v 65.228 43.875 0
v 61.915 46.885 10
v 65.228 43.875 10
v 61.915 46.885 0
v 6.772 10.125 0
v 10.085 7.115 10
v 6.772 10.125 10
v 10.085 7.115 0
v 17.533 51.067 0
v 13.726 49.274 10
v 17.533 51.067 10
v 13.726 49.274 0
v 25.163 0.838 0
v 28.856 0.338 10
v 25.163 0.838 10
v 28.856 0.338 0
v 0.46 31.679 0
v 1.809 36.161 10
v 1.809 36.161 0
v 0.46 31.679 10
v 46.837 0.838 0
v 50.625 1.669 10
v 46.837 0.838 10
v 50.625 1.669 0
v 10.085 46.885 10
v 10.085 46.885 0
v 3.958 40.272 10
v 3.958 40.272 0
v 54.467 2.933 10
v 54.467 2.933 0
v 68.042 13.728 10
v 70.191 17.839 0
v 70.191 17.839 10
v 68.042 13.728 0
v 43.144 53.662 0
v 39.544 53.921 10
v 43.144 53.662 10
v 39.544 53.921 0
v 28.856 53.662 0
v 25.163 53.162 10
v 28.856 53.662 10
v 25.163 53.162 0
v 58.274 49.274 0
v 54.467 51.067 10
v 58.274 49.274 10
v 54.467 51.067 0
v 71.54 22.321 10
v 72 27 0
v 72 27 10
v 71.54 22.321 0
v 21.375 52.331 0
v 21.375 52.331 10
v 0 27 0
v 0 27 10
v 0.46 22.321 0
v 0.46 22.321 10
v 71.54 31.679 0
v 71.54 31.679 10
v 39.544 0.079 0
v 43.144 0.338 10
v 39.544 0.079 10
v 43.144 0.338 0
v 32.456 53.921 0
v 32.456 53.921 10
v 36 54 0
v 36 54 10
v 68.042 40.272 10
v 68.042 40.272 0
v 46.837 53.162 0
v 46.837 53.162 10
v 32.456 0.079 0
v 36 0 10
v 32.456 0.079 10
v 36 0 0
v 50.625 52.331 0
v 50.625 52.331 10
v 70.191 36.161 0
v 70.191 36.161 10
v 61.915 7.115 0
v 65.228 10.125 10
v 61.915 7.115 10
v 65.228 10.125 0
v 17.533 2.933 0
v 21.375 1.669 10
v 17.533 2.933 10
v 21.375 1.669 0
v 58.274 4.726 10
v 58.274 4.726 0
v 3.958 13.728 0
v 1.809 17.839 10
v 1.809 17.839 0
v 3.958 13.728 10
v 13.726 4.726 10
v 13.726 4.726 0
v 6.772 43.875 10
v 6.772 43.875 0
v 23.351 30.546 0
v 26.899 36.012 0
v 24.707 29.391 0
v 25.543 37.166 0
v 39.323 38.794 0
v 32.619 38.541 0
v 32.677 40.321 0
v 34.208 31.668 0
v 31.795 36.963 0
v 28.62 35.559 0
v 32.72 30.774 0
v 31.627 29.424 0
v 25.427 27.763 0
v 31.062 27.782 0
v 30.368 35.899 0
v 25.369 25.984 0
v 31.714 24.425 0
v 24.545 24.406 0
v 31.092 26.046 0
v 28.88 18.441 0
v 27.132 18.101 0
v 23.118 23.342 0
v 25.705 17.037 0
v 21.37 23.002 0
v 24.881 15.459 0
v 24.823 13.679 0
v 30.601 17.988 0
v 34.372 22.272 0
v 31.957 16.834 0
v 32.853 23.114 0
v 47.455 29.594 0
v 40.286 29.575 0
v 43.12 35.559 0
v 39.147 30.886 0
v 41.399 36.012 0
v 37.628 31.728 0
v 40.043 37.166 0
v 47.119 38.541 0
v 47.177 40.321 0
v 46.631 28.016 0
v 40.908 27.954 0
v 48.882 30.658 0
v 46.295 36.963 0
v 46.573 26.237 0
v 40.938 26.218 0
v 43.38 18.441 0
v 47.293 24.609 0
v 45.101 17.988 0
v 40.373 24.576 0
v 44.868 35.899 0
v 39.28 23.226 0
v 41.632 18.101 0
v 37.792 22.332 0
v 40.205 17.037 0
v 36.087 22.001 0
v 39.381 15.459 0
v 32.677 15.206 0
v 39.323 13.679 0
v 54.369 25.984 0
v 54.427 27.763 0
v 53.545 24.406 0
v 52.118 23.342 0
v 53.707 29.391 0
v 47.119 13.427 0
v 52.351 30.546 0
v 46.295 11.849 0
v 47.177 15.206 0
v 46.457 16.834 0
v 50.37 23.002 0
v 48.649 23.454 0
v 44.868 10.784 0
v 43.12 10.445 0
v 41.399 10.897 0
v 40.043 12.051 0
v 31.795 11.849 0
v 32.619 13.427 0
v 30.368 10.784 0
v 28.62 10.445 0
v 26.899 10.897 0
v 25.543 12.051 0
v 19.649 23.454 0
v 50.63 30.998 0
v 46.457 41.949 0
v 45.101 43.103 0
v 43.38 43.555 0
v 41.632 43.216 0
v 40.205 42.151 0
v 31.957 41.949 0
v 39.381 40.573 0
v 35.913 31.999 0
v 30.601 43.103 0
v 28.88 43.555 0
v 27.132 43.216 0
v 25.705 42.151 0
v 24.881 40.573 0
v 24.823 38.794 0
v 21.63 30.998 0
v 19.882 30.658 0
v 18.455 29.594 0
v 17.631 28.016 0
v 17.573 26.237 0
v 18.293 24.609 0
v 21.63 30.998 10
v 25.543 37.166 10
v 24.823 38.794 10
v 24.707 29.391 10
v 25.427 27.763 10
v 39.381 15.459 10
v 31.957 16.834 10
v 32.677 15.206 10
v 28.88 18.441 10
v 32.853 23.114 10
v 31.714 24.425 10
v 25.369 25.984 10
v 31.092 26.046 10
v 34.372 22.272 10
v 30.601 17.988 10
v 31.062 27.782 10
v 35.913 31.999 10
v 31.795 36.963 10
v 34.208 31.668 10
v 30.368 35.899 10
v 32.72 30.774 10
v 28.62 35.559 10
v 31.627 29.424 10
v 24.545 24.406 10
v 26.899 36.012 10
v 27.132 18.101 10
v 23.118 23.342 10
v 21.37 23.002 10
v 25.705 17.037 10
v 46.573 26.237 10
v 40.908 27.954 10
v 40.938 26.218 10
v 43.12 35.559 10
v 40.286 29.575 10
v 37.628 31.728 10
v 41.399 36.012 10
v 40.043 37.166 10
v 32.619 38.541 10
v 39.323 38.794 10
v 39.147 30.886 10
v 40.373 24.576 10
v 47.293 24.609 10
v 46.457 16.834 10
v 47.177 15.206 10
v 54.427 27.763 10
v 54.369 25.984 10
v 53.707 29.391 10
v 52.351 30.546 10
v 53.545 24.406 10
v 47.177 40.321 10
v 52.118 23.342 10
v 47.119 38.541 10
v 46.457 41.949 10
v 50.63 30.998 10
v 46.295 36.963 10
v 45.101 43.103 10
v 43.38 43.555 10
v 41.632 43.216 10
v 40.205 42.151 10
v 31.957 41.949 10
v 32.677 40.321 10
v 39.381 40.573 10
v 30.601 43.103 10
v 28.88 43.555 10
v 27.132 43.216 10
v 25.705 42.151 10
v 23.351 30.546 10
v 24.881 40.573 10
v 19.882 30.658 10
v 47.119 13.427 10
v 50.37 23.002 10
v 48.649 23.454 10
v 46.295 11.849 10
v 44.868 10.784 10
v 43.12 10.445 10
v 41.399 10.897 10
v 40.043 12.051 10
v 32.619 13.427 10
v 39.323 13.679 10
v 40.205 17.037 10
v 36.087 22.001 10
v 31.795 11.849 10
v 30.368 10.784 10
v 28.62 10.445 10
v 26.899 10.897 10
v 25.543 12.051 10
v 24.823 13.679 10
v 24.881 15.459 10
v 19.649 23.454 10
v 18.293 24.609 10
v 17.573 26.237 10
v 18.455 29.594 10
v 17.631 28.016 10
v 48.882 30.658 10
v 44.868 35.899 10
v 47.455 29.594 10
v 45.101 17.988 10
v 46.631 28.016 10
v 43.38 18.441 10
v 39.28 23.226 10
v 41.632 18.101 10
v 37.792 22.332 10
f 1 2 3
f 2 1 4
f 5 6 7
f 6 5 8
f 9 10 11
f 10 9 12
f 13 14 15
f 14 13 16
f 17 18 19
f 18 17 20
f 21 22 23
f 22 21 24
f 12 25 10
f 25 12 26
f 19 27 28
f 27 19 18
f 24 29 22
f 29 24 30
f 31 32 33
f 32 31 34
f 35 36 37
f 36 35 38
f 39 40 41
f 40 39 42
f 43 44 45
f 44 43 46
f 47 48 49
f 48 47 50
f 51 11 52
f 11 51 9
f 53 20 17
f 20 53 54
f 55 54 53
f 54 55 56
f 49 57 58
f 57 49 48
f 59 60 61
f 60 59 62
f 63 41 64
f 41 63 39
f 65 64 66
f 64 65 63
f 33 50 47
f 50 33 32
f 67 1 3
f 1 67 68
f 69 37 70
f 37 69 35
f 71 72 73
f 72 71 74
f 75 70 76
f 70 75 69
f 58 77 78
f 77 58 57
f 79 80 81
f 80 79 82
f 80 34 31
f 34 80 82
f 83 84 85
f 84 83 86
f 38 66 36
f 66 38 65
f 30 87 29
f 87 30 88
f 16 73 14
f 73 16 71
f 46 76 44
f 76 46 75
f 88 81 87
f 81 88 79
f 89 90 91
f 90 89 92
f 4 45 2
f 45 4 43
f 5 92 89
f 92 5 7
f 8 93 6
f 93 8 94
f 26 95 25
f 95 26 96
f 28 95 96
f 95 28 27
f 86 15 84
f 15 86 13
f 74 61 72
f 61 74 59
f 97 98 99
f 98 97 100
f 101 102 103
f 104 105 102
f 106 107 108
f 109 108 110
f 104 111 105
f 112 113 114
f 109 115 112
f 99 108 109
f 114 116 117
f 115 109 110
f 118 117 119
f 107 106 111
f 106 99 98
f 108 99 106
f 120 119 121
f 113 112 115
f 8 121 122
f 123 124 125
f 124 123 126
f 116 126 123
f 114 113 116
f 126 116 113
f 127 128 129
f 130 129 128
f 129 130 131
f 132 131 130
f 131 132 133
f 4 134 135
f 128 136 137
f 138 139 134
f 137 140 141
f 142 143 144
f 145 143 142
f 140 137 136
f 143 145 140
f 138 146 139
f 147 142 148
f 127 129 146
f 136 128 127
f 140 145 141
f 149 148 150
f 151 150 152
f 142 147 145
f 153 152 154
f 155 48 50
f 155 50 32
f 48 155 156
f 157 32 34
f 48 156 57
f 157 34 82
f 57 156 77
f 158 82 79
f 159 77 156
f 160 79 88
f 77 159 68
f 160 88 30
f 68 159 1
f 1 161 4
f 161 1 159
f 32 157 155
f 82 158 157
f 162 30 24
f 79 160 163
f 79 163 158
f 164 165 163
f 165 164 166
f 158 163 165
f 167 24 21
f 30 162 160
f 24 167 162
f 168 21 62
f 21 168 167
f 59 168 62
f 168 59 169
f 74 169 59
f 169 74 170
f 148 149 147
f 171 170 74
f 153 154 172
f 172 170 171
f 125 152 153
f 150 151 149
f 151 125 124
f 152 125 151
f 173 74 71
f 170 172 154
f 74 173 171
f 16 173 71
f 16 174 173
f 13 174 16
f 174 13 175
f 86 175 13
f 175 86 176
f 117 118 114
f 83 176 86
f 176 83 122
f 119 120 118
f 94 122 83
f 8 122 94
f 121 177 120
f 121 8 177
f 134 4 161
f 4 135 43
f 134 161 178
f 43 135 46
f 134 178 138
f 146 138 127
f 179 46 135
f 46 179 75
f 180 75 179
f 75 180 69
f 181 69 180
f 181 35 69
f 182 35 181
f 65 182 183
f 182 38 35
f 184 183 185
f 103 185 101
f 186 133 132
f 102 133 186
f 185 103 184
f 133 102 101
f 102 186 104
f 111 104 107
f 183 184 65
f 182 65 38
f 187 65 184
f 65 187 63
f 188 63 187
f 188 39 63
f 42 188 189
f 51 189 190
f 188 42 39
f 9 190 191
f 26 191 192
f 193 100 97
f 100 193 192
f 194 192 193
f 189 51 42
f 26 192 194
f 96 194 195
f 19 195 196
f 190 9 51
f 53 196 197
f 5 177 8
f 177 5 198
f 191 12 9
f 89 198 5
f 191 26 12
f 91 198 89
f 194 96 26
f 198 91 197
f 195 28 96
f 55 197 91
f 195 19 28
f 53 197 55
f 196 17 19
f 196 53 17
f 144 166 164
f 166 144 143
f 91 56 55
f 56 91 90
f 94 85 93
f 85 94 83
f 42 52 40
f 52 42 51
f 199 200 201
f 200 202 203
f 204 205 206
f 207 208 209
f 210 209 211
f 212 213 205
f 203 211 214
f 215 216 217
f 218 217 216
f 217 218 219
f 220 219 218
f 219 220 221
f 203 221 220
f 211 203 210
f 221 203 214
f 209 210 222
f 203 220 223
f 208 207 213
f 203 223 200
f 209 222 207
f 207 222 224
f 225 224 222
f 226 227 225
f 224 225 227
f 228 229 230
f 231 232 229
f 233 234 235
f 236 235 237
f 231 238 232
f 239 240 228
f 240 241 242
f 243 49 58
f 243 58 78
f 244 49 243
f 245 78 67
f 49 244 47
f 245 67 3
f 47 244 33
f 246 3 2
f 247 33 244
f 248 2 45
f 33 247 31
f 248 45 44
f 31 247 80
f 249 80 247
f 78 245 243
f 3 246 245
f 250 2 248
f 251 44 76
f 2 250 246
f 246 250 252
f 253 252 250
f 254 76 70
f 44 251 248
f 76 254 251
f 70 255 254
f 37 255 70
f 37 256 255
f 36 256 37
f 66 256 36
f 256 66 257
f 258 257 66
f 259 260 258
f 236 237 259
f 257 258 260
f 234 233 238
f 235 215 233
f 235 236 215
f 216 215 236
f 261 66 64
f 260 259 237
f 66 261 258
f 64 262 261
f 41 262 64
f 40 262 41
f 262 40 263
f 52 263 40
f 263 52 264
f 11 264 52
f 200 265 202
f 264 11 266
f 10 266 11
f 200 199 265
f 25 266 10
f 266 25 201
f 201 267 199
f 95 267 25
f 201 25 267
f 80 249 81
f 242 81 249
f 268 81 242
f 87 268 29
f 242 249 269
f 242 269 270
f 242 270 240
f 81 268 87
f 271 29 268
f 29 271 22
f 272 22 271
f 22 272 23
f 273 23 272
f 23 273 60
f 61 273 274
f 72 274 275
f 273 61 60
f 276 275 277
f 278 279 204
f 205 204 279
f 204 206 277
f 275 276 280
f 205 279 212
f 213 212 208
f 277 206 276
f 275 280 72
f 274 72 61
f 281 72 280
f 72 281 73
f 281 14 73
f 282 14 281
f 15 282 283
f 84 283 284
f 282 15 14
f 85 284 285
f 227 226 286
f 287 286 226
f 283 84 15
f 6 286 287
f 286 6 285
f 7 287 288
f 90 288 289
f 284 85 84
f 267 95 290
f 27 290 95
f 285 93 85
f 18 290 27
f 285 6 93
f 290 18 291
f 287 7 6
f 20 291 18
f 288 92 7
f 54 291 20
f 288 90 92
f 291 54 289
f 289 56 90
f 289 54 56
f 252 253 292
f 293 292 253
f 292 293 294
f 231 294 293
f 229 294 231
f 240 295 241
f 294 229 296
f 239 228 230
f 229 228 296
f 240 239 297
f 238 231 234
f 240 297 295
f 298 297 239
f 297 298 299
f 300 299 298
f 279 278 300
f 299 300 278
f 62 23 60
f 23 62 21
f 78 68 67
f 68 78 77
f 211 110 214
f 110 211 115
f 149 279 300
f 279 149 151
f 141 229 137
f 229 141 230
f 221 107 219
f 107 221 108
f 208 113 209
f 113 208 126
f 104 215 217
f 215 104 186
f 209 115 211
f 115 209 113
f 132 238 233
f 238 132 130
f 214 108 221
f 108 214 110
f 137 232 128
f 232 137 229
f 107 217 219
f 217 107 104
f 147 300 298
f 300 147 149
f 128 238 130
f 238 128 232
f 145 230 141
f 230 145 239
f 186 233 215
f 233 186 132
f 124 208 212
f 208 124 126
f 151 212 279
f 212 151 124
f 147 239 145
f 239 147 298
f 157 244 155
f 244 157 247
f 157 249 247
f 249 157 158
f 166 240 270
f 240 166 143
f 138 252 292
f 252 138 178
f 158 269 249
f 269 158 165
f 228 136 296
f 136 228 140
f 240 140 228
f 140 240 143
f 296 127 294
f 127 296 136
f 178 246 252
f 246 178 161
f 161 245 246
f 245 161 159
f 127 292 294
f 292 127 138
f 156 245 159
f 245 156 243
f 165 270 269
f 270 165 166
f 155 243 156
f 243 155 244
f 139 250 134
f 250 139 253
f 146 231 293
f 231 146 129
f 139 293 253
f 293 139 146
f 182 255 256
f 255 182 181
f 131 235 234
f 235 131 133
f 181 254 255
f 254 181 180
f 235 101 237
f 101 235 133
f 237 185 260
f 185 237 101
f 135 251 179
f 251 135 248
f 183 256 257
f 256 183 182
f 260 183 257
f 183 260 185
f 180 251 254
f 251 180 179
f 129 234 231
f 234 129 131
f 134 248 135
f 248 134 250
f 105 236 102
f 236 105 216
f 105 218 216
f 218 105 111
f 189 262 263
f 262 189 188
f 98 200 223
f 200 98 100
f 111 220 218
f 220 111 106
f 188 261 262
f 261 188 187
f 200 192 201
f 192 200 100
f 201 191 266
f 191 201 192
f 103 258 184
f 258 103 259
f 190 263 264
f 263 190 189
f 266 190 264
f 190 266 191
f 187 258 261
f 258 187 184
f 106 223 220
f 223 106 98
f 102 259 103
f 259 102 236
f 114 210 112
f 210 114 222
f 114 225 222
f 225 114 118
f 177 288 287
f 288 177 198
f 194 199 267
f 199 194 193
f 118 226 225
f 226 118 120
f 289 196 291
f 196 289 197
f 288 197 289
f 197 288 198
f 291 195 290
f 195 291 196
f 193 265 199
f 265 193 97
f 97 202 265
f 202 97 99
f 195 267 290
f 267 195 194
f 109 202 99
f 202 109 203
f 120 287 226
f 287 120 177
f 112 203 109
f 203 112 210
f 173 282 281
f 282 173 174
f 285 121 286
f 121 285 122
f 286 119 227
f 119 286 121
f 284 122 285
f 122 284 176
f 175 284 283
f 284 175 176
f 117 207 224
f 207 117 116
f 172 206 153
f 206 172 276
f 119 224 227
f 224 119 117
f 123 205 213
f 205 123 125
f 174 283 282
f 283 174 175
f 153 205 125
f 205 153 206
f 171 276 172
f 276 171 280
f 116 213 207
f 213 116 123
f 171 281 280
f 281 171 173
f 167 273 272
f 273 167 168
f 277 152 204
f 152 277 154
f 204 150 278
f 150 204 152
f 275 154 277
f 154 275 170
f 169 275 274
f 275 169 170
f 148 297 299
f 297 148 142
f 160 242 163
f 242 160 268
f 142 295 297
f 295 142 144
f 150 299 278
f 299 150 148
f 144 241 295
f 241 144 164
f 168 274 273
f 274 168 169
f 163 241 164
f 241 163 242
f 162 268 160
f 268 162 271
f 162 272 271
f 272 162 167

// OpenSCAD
$fn = 32;

// ----------------------------------------------------------------------
// Cam plate: double_lobe cam, base R24
// ----------------------------------------------------------------------

// --- parameters (mm) ---
base_r = 24;              // base circle radius
lobe_h = 12;              // cam lobe rise
bore_r = 5;               // shaft bore radius
plate_t = 10;             // plate thickness, Z (extrusion height)
ring_r = 14.5;            // lightening ring radius
bolt_r = 4;               // lightening hole radius

profile = [[72, 27], [71.54, 31.679], [70.191, 36.161], [68.042, 40.272], [65.228, 43.875], [61.915, 46.885], [58.274, 49.274], [54.467, 51.067], [50.625, 52.331], [46.837, 53.162], [43.144, 53.662], [39.544, 53.921], [36, 54], [32.456, 53.921], [28.856, 53.662], [25.163, 53.162], [21.375, 52.331], [17.533, 51.067], [13.726, 49.274], [10.085, 46.885], [6.772, 43.875], [3.958, 40.272], [1.809, 36.161], [0.46, 31.679], [0, 27], [0.46, 22.321], [1.809, 17.839], [3.958, 13.728], [6.772, 10.125], [10.085, 7.115], [13.726, 4.726], [17.533, 2.933], [21.375, 1.669], [25.163, 0.838], [28.856, 0.338], [32.456, 0.079], [36, 0], [39.544, 0.079], [43.144, 0.338], [46.837, 0.838], [50.625, 1.669], [54.467, 2.933], [58.274, 4.726], [61.915, 7.115], [65.228, 10.125], [68.042, 13.728], [70.191, 17.839], [71.54, 22.321]];  // primary outline, 48 points, counter clockwise
void_1 = [[40.908, 27.954], [40.286, 29.575], [39.147, 30.886], [37.628, 31.728], [35.913, 31.999], [34.208, 31.668], [32.72, 30.774], [31.627, 29.424], [31.062, 27.782], [31.092, 26.046], [31.714, 24.425], [32.853, 23.114], [34.372, 22.272], [36.087, 22.001], [37.792, 22.332], [39.28, 23.226], [40.373, 24.576], [40.938, 26.218]];  // shaft bore, 18 points
void_2 = [[54.427, 27.763], [53.707, 29.391], [52.351, 30.546], [50.63, 30.998], [48.882, 30.658], [47.455, 29.594], [46.631, 28.016], [46.573, 26.237], [47.293, 24.609], [48.649, 23.454], [50.37, 23.002], [52.118, 23.342], [53.545, 24.406], [54.369, 25.984]];  // lightening hole 1, 14 points
void_3 = [[47.177, 40.321], [46.457, 41.949], [45.101, 43.103], [43.38, 43.555], [41.632, 43.216], [40.205, 42.151], [39.381, 40.573], [39.323, 38.794], [40.043, 37.166], [41.399, 36.012], [43.12, 35.559], [44.868, 35.899], [46.295, 36.963], [47.119, 38.541]];  // lightening hole 2, 14 points
void_4 = [[32.677, 40.321], [31.957, 41.949], [30.601, 43.103], [28.88, 43.555], [27.132, 43.216], [25.705, 42.151], [24.881, 40.573], [24.823, 38.794], [25.543, 37.166], [26.899, 36.012], [28.62, 35.559], [30.368, 35.899], [31.795, 36.963], [32.619, 38.541]];  // lightening hole 3, 14 points
void_5 = [[25.427, 27.763], [24.707, 29.391], [23.351, 30.546], [21.63, 30.998], [19.882, 30.658], [18.455, 29.594], [17.631, 28.016], [17.573, 26.237], [18.293, 24.609], [19.649, 23.454], [21.37, 23.002], [23.118, 23.342], [24.545, 24.406], [25.369, 25.984]];  // lightening hole 4, 14 points
void_6 = [[32.677, 15.206], [31.957, 16.834], [30.601, 17.988], [28.88, 18.441], [27.132, 18.101], [25.705, 17.037], [24.881, 15.459], [24.823, 13.679], [25.543, 12.051], [26.899, 10.897], [28.62, 10.445], [30.368, 10.784], [31.795, 11.849], [32.619, 13.427]];  // lightening hole 5, 14 points
void_7 = [[47.177, 15.206], [46.457, 16.834], [45.101, 17.988], [43.38, 18.441], [41.632, 18.101], [40.205, 17.037], [39.381, 15.459], [39.323, 13.679], [40.043, 12.051], [41.399, 10.897], [43.12, 10.445], [44.868, 10.784], [46.295, 11.849], [47.119, 13.427]];  // lightening hole 6, 14 points

// --- the one profile operation ---
difference() {
  linear_extrude(height = plate_t) polygon(points = profile);
  translate([0, 0, -1])
    linear_extrude(height = plate_t + 2) polygon(points = void_1);
  translate([0, 0, -1])
    linear_extrude(height = plate_t + 2) polygon(points = void_2);
  translate([0, 0, -1])
    linear_extrude(height = plate_t + 2) polygon(points = void_3);
  translate([0, 0, -1])
    linear_extrude(height = plate_t + 2) polygon(points = void_4);
  translate([0, 0, -1])
    linear_extrude(height = plate_t + 2) polygon(points = void_5);
  translate([0, 0, -1])
    linear_extrude(height = plate_t + 2) polygon(points = void_6);
  translate([0, 0, -1])
    linear_extrude(height = plate_t + 2) polygon(points = void_7);
}
